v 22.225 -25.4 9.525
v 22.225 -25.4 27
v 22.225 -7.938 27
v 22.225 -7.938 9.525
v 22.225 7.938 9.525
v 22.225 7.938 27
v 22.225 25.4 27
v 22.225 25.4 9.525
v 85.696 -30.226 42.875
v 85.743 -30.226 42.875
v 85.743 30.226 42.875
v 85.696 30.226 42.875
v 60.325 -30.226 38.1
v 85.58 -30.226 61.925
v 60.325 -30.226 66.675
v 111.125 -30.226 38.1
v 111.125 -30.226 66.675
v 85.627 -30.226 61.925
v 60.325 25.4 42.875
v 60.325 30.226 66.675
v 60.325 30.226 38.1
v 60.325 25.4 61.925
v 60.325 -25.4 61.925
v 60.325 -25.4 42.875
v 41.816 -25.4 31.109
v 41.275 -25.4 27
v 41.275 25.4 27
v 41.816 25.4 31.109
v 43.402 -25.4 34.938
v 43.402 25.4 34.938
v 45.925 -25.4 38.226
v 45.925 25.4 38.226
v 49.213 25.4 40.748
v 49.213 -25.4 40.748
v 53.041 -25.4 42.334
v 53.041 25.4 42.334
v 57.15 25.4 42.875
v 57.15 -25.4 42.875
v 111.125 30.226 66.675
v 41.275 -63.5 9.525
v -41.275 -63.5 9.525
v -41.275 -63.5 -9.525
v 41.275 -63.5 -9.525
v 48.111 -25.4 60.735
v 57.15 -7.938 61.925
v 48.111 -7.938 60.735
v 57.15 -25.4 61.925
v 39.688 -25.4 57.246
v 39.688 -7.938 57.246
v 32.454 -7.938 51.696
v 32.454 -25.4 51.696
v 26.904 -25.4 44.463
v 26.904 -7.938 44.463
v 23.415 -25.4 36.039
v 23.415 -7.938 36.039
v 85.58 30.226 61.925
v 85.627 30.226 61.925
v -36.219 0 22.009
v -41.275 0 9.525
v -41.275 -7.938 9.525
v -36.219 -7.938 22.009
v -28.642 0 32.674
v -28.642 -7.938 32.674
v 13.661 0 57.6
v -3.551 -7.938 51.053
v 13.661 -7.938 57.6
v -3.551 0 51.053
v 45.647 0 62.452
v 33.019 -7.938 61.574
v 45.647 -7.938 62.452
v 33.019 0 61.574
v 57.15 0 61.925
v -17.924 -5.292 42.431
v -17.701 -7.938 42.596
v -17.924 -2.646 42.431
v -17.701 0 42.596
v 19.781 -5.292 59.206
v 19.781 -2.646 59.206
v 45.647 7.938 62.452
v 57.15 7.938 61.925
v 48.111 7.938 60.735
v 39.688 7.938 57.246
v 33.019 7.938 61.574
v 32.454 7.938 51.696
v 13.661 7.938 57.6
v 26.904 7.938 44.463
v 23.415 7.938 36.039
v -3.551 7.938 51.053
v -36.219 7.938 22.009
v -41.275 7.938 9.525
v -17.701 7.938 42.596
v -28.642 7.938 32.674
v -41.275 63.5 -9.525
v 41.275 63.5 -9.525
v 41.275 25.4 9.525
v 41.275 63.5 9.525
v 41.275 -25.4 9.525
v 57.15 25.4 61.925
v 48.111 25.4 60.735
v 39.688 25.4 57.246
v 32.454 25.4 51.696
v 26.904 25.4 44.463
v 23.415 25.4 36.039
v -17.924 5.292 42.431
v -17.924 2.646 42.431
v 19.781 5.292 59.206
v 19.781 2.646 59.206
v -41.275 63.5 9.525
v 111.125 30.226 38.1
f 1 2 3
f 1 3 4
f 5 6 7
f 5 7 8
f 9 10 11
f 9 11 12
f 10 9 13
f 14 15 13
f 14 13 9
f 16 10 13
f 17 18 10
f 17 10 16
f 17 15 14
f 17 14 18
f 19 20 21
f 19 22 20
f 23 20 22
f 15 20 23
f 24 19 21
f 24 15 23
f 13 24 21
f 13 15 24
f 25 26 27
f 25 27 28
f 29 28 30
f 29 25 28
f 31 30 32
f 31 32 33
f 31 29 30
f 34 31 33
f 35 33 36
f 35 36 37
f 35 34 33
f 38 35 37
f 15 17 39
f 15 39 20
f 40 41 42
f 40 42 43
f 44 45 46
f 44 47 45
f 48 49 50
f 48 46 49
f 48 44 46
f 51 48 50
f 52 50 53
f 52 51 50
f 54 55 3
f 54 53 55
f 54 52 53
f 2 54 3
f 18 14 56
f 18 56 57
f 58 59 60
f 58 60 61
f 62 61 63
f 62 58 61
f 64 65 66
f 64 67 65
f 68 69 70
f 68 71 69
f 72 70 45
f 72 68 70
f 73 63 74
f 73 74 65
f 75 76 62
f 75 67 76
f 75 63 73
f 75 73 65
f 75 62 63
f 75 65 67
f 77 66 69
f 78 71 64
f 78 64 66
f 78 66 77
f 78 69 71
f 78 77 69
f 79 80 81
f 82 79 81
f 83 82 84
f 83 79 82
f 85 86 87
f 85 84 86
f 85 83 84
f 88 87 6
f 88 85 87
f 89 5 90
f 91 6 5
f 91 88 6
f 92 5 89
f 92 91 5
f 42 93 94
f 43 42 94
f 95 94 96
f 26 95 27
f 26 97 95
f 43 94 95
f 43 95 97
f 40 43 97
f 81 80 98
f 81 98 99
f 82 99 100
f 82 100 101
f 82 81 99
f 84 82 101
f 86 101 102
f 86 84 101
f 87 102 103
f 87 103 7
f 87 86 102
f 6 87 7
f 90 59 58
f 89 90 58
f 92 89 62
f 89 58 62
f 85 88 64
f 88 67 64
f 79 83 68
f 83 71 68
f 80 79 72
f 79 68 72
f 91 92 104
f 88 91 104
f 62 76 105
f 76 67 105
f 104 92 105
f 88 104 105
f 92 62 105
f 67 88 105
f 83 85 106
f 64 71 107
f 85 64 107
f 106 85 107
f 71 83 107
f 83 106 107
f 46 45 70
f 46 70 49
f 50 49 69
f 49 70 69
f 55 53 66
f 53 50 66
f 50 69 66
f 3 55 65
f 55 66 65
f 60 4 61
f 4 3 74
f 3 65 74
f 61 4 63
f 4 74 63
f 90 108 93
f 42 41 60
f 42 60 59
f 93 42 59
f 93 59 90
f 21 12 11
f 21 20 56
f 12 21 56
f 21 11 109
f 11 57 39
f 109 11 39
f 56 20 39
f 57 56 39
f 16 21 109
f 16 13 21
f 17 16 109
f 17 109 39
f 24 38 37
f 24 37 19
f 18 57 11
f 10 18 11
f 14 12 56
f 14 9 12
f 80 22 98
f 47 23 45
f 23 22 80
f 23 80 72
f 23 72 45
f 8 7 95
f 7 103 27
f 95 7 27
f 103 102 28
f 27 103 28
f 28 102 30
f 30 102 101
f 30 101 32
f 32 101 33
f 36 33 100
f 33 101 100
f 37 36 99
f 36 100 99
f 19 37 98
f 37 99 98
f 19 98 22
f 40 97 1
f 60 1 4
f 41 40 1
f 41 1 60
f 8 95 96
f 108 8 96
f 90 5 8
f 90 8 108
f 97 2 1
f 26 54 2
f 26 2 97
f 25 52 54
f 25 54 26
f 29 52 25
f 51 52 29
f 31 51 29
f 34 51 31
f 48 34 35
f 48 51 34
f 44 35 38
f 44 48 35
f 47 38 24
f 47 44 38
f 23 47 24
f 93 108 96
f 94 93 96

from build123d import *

# Parameters (mm, degrees)
F1_DEPTH = 63.5
F2_DEPTH = 7.9375
F3_DEPTH = 25.4
F4_DEPTH = 30.226


with BuildPart() as f1:
    # F0 (on Front) → F1 (new body, symmetric)
    with BuildSketch(Plane.XZ):
        Polygon((-41.275, 9.525), (-41.275, -9.525), (41.275, -9.525), (41.275, 9.525), (22.225, 9.525), align=None)
    extrude(amount=F1_DEPTH, both=True)

    # F0 (on Front) → F2 (join, symmetric)
    with BuildSketch(Plane.XZ):
        with BuildLine():
            add(Edge.make_bspline(
                [(-41.275, 9.525), (-29.9963708967, 51.1887520552), (24.8447079211, 65.5416920781), (57.15, 61.9252)],
                knots=[0, 0, 0, 0, 111.5045361635, 111.5045361635, 111.5045361635, 111.5045361635], degree=3))
            Line((-41.275, 9.525), (22.225, 9.525))
            Line((22.225, 9.525), (22.225, 27.0002))
            ThreePointArc((22.225, 27.0002), (32.4542956671, 51.6959043329), (57.15, 61.9252))
        make_face()
    extrude(amount=F2_DEPTH, both=True)

    # F0 (on Front) → F3 (join, symmetric)
    with BuildSketch(Plane.XZ):
        with BuildLine():
            Line((22.225, 9.525), (41.275, 9.525))
            Line((41.275, 9.525), (41.275, 27.0002))
            ThreePointArc((41.275, 27.0002), (45.9246798487, 38.2255201513), (57.15, 42.8752))
            Line((57.15, 42.8752), (60.325, 42.8752))
            Line((60.325, 42.8752), (60.325, 61.9252))
            Line((60.325, 61.9252), (57.15, 61.9252))
            ThreePointArc((57.15, 61.9252), (32.4542956671, 51.6959043329), (22.225, 27.0002))
            Line((22.225, 27.0002), (22.225, 9.525))
        make_face()
    extrude(amount=F3_DEPTH, both=True)

    # F0 (on Front) → F4 (join, symmetric)
    with BuildSketch(Plane.XZ):
        Polygon((85.6958447059, 42.8752), (60.325, 42.8752), (60.325, 38.1), (85.725, 38.1), align=None)
        Polygon((60.325, 66.675), (60.325, 61.9252), (85.5795336922, 61.9252), (85.5505334795, 66.675), align=None)
        Polygon((85.5795336922, 61.9252), (60.325, 61.9252), (60.325, 42.8752), (85.6958447059, 42.8752), align=None)
        Polygon((85.5505334795, 66.675), (85.5795336922, 61.9252), (85.6267288327, 61.9252), (85.7430398464, 42.8752), (85.6958447059, 42.8752), (85.725, 38.1), (111.125, 38.1), (111.125, 66.675), align=None)
    extrude(amount=F4_DEPTH, both=True)


solid = f1.part
